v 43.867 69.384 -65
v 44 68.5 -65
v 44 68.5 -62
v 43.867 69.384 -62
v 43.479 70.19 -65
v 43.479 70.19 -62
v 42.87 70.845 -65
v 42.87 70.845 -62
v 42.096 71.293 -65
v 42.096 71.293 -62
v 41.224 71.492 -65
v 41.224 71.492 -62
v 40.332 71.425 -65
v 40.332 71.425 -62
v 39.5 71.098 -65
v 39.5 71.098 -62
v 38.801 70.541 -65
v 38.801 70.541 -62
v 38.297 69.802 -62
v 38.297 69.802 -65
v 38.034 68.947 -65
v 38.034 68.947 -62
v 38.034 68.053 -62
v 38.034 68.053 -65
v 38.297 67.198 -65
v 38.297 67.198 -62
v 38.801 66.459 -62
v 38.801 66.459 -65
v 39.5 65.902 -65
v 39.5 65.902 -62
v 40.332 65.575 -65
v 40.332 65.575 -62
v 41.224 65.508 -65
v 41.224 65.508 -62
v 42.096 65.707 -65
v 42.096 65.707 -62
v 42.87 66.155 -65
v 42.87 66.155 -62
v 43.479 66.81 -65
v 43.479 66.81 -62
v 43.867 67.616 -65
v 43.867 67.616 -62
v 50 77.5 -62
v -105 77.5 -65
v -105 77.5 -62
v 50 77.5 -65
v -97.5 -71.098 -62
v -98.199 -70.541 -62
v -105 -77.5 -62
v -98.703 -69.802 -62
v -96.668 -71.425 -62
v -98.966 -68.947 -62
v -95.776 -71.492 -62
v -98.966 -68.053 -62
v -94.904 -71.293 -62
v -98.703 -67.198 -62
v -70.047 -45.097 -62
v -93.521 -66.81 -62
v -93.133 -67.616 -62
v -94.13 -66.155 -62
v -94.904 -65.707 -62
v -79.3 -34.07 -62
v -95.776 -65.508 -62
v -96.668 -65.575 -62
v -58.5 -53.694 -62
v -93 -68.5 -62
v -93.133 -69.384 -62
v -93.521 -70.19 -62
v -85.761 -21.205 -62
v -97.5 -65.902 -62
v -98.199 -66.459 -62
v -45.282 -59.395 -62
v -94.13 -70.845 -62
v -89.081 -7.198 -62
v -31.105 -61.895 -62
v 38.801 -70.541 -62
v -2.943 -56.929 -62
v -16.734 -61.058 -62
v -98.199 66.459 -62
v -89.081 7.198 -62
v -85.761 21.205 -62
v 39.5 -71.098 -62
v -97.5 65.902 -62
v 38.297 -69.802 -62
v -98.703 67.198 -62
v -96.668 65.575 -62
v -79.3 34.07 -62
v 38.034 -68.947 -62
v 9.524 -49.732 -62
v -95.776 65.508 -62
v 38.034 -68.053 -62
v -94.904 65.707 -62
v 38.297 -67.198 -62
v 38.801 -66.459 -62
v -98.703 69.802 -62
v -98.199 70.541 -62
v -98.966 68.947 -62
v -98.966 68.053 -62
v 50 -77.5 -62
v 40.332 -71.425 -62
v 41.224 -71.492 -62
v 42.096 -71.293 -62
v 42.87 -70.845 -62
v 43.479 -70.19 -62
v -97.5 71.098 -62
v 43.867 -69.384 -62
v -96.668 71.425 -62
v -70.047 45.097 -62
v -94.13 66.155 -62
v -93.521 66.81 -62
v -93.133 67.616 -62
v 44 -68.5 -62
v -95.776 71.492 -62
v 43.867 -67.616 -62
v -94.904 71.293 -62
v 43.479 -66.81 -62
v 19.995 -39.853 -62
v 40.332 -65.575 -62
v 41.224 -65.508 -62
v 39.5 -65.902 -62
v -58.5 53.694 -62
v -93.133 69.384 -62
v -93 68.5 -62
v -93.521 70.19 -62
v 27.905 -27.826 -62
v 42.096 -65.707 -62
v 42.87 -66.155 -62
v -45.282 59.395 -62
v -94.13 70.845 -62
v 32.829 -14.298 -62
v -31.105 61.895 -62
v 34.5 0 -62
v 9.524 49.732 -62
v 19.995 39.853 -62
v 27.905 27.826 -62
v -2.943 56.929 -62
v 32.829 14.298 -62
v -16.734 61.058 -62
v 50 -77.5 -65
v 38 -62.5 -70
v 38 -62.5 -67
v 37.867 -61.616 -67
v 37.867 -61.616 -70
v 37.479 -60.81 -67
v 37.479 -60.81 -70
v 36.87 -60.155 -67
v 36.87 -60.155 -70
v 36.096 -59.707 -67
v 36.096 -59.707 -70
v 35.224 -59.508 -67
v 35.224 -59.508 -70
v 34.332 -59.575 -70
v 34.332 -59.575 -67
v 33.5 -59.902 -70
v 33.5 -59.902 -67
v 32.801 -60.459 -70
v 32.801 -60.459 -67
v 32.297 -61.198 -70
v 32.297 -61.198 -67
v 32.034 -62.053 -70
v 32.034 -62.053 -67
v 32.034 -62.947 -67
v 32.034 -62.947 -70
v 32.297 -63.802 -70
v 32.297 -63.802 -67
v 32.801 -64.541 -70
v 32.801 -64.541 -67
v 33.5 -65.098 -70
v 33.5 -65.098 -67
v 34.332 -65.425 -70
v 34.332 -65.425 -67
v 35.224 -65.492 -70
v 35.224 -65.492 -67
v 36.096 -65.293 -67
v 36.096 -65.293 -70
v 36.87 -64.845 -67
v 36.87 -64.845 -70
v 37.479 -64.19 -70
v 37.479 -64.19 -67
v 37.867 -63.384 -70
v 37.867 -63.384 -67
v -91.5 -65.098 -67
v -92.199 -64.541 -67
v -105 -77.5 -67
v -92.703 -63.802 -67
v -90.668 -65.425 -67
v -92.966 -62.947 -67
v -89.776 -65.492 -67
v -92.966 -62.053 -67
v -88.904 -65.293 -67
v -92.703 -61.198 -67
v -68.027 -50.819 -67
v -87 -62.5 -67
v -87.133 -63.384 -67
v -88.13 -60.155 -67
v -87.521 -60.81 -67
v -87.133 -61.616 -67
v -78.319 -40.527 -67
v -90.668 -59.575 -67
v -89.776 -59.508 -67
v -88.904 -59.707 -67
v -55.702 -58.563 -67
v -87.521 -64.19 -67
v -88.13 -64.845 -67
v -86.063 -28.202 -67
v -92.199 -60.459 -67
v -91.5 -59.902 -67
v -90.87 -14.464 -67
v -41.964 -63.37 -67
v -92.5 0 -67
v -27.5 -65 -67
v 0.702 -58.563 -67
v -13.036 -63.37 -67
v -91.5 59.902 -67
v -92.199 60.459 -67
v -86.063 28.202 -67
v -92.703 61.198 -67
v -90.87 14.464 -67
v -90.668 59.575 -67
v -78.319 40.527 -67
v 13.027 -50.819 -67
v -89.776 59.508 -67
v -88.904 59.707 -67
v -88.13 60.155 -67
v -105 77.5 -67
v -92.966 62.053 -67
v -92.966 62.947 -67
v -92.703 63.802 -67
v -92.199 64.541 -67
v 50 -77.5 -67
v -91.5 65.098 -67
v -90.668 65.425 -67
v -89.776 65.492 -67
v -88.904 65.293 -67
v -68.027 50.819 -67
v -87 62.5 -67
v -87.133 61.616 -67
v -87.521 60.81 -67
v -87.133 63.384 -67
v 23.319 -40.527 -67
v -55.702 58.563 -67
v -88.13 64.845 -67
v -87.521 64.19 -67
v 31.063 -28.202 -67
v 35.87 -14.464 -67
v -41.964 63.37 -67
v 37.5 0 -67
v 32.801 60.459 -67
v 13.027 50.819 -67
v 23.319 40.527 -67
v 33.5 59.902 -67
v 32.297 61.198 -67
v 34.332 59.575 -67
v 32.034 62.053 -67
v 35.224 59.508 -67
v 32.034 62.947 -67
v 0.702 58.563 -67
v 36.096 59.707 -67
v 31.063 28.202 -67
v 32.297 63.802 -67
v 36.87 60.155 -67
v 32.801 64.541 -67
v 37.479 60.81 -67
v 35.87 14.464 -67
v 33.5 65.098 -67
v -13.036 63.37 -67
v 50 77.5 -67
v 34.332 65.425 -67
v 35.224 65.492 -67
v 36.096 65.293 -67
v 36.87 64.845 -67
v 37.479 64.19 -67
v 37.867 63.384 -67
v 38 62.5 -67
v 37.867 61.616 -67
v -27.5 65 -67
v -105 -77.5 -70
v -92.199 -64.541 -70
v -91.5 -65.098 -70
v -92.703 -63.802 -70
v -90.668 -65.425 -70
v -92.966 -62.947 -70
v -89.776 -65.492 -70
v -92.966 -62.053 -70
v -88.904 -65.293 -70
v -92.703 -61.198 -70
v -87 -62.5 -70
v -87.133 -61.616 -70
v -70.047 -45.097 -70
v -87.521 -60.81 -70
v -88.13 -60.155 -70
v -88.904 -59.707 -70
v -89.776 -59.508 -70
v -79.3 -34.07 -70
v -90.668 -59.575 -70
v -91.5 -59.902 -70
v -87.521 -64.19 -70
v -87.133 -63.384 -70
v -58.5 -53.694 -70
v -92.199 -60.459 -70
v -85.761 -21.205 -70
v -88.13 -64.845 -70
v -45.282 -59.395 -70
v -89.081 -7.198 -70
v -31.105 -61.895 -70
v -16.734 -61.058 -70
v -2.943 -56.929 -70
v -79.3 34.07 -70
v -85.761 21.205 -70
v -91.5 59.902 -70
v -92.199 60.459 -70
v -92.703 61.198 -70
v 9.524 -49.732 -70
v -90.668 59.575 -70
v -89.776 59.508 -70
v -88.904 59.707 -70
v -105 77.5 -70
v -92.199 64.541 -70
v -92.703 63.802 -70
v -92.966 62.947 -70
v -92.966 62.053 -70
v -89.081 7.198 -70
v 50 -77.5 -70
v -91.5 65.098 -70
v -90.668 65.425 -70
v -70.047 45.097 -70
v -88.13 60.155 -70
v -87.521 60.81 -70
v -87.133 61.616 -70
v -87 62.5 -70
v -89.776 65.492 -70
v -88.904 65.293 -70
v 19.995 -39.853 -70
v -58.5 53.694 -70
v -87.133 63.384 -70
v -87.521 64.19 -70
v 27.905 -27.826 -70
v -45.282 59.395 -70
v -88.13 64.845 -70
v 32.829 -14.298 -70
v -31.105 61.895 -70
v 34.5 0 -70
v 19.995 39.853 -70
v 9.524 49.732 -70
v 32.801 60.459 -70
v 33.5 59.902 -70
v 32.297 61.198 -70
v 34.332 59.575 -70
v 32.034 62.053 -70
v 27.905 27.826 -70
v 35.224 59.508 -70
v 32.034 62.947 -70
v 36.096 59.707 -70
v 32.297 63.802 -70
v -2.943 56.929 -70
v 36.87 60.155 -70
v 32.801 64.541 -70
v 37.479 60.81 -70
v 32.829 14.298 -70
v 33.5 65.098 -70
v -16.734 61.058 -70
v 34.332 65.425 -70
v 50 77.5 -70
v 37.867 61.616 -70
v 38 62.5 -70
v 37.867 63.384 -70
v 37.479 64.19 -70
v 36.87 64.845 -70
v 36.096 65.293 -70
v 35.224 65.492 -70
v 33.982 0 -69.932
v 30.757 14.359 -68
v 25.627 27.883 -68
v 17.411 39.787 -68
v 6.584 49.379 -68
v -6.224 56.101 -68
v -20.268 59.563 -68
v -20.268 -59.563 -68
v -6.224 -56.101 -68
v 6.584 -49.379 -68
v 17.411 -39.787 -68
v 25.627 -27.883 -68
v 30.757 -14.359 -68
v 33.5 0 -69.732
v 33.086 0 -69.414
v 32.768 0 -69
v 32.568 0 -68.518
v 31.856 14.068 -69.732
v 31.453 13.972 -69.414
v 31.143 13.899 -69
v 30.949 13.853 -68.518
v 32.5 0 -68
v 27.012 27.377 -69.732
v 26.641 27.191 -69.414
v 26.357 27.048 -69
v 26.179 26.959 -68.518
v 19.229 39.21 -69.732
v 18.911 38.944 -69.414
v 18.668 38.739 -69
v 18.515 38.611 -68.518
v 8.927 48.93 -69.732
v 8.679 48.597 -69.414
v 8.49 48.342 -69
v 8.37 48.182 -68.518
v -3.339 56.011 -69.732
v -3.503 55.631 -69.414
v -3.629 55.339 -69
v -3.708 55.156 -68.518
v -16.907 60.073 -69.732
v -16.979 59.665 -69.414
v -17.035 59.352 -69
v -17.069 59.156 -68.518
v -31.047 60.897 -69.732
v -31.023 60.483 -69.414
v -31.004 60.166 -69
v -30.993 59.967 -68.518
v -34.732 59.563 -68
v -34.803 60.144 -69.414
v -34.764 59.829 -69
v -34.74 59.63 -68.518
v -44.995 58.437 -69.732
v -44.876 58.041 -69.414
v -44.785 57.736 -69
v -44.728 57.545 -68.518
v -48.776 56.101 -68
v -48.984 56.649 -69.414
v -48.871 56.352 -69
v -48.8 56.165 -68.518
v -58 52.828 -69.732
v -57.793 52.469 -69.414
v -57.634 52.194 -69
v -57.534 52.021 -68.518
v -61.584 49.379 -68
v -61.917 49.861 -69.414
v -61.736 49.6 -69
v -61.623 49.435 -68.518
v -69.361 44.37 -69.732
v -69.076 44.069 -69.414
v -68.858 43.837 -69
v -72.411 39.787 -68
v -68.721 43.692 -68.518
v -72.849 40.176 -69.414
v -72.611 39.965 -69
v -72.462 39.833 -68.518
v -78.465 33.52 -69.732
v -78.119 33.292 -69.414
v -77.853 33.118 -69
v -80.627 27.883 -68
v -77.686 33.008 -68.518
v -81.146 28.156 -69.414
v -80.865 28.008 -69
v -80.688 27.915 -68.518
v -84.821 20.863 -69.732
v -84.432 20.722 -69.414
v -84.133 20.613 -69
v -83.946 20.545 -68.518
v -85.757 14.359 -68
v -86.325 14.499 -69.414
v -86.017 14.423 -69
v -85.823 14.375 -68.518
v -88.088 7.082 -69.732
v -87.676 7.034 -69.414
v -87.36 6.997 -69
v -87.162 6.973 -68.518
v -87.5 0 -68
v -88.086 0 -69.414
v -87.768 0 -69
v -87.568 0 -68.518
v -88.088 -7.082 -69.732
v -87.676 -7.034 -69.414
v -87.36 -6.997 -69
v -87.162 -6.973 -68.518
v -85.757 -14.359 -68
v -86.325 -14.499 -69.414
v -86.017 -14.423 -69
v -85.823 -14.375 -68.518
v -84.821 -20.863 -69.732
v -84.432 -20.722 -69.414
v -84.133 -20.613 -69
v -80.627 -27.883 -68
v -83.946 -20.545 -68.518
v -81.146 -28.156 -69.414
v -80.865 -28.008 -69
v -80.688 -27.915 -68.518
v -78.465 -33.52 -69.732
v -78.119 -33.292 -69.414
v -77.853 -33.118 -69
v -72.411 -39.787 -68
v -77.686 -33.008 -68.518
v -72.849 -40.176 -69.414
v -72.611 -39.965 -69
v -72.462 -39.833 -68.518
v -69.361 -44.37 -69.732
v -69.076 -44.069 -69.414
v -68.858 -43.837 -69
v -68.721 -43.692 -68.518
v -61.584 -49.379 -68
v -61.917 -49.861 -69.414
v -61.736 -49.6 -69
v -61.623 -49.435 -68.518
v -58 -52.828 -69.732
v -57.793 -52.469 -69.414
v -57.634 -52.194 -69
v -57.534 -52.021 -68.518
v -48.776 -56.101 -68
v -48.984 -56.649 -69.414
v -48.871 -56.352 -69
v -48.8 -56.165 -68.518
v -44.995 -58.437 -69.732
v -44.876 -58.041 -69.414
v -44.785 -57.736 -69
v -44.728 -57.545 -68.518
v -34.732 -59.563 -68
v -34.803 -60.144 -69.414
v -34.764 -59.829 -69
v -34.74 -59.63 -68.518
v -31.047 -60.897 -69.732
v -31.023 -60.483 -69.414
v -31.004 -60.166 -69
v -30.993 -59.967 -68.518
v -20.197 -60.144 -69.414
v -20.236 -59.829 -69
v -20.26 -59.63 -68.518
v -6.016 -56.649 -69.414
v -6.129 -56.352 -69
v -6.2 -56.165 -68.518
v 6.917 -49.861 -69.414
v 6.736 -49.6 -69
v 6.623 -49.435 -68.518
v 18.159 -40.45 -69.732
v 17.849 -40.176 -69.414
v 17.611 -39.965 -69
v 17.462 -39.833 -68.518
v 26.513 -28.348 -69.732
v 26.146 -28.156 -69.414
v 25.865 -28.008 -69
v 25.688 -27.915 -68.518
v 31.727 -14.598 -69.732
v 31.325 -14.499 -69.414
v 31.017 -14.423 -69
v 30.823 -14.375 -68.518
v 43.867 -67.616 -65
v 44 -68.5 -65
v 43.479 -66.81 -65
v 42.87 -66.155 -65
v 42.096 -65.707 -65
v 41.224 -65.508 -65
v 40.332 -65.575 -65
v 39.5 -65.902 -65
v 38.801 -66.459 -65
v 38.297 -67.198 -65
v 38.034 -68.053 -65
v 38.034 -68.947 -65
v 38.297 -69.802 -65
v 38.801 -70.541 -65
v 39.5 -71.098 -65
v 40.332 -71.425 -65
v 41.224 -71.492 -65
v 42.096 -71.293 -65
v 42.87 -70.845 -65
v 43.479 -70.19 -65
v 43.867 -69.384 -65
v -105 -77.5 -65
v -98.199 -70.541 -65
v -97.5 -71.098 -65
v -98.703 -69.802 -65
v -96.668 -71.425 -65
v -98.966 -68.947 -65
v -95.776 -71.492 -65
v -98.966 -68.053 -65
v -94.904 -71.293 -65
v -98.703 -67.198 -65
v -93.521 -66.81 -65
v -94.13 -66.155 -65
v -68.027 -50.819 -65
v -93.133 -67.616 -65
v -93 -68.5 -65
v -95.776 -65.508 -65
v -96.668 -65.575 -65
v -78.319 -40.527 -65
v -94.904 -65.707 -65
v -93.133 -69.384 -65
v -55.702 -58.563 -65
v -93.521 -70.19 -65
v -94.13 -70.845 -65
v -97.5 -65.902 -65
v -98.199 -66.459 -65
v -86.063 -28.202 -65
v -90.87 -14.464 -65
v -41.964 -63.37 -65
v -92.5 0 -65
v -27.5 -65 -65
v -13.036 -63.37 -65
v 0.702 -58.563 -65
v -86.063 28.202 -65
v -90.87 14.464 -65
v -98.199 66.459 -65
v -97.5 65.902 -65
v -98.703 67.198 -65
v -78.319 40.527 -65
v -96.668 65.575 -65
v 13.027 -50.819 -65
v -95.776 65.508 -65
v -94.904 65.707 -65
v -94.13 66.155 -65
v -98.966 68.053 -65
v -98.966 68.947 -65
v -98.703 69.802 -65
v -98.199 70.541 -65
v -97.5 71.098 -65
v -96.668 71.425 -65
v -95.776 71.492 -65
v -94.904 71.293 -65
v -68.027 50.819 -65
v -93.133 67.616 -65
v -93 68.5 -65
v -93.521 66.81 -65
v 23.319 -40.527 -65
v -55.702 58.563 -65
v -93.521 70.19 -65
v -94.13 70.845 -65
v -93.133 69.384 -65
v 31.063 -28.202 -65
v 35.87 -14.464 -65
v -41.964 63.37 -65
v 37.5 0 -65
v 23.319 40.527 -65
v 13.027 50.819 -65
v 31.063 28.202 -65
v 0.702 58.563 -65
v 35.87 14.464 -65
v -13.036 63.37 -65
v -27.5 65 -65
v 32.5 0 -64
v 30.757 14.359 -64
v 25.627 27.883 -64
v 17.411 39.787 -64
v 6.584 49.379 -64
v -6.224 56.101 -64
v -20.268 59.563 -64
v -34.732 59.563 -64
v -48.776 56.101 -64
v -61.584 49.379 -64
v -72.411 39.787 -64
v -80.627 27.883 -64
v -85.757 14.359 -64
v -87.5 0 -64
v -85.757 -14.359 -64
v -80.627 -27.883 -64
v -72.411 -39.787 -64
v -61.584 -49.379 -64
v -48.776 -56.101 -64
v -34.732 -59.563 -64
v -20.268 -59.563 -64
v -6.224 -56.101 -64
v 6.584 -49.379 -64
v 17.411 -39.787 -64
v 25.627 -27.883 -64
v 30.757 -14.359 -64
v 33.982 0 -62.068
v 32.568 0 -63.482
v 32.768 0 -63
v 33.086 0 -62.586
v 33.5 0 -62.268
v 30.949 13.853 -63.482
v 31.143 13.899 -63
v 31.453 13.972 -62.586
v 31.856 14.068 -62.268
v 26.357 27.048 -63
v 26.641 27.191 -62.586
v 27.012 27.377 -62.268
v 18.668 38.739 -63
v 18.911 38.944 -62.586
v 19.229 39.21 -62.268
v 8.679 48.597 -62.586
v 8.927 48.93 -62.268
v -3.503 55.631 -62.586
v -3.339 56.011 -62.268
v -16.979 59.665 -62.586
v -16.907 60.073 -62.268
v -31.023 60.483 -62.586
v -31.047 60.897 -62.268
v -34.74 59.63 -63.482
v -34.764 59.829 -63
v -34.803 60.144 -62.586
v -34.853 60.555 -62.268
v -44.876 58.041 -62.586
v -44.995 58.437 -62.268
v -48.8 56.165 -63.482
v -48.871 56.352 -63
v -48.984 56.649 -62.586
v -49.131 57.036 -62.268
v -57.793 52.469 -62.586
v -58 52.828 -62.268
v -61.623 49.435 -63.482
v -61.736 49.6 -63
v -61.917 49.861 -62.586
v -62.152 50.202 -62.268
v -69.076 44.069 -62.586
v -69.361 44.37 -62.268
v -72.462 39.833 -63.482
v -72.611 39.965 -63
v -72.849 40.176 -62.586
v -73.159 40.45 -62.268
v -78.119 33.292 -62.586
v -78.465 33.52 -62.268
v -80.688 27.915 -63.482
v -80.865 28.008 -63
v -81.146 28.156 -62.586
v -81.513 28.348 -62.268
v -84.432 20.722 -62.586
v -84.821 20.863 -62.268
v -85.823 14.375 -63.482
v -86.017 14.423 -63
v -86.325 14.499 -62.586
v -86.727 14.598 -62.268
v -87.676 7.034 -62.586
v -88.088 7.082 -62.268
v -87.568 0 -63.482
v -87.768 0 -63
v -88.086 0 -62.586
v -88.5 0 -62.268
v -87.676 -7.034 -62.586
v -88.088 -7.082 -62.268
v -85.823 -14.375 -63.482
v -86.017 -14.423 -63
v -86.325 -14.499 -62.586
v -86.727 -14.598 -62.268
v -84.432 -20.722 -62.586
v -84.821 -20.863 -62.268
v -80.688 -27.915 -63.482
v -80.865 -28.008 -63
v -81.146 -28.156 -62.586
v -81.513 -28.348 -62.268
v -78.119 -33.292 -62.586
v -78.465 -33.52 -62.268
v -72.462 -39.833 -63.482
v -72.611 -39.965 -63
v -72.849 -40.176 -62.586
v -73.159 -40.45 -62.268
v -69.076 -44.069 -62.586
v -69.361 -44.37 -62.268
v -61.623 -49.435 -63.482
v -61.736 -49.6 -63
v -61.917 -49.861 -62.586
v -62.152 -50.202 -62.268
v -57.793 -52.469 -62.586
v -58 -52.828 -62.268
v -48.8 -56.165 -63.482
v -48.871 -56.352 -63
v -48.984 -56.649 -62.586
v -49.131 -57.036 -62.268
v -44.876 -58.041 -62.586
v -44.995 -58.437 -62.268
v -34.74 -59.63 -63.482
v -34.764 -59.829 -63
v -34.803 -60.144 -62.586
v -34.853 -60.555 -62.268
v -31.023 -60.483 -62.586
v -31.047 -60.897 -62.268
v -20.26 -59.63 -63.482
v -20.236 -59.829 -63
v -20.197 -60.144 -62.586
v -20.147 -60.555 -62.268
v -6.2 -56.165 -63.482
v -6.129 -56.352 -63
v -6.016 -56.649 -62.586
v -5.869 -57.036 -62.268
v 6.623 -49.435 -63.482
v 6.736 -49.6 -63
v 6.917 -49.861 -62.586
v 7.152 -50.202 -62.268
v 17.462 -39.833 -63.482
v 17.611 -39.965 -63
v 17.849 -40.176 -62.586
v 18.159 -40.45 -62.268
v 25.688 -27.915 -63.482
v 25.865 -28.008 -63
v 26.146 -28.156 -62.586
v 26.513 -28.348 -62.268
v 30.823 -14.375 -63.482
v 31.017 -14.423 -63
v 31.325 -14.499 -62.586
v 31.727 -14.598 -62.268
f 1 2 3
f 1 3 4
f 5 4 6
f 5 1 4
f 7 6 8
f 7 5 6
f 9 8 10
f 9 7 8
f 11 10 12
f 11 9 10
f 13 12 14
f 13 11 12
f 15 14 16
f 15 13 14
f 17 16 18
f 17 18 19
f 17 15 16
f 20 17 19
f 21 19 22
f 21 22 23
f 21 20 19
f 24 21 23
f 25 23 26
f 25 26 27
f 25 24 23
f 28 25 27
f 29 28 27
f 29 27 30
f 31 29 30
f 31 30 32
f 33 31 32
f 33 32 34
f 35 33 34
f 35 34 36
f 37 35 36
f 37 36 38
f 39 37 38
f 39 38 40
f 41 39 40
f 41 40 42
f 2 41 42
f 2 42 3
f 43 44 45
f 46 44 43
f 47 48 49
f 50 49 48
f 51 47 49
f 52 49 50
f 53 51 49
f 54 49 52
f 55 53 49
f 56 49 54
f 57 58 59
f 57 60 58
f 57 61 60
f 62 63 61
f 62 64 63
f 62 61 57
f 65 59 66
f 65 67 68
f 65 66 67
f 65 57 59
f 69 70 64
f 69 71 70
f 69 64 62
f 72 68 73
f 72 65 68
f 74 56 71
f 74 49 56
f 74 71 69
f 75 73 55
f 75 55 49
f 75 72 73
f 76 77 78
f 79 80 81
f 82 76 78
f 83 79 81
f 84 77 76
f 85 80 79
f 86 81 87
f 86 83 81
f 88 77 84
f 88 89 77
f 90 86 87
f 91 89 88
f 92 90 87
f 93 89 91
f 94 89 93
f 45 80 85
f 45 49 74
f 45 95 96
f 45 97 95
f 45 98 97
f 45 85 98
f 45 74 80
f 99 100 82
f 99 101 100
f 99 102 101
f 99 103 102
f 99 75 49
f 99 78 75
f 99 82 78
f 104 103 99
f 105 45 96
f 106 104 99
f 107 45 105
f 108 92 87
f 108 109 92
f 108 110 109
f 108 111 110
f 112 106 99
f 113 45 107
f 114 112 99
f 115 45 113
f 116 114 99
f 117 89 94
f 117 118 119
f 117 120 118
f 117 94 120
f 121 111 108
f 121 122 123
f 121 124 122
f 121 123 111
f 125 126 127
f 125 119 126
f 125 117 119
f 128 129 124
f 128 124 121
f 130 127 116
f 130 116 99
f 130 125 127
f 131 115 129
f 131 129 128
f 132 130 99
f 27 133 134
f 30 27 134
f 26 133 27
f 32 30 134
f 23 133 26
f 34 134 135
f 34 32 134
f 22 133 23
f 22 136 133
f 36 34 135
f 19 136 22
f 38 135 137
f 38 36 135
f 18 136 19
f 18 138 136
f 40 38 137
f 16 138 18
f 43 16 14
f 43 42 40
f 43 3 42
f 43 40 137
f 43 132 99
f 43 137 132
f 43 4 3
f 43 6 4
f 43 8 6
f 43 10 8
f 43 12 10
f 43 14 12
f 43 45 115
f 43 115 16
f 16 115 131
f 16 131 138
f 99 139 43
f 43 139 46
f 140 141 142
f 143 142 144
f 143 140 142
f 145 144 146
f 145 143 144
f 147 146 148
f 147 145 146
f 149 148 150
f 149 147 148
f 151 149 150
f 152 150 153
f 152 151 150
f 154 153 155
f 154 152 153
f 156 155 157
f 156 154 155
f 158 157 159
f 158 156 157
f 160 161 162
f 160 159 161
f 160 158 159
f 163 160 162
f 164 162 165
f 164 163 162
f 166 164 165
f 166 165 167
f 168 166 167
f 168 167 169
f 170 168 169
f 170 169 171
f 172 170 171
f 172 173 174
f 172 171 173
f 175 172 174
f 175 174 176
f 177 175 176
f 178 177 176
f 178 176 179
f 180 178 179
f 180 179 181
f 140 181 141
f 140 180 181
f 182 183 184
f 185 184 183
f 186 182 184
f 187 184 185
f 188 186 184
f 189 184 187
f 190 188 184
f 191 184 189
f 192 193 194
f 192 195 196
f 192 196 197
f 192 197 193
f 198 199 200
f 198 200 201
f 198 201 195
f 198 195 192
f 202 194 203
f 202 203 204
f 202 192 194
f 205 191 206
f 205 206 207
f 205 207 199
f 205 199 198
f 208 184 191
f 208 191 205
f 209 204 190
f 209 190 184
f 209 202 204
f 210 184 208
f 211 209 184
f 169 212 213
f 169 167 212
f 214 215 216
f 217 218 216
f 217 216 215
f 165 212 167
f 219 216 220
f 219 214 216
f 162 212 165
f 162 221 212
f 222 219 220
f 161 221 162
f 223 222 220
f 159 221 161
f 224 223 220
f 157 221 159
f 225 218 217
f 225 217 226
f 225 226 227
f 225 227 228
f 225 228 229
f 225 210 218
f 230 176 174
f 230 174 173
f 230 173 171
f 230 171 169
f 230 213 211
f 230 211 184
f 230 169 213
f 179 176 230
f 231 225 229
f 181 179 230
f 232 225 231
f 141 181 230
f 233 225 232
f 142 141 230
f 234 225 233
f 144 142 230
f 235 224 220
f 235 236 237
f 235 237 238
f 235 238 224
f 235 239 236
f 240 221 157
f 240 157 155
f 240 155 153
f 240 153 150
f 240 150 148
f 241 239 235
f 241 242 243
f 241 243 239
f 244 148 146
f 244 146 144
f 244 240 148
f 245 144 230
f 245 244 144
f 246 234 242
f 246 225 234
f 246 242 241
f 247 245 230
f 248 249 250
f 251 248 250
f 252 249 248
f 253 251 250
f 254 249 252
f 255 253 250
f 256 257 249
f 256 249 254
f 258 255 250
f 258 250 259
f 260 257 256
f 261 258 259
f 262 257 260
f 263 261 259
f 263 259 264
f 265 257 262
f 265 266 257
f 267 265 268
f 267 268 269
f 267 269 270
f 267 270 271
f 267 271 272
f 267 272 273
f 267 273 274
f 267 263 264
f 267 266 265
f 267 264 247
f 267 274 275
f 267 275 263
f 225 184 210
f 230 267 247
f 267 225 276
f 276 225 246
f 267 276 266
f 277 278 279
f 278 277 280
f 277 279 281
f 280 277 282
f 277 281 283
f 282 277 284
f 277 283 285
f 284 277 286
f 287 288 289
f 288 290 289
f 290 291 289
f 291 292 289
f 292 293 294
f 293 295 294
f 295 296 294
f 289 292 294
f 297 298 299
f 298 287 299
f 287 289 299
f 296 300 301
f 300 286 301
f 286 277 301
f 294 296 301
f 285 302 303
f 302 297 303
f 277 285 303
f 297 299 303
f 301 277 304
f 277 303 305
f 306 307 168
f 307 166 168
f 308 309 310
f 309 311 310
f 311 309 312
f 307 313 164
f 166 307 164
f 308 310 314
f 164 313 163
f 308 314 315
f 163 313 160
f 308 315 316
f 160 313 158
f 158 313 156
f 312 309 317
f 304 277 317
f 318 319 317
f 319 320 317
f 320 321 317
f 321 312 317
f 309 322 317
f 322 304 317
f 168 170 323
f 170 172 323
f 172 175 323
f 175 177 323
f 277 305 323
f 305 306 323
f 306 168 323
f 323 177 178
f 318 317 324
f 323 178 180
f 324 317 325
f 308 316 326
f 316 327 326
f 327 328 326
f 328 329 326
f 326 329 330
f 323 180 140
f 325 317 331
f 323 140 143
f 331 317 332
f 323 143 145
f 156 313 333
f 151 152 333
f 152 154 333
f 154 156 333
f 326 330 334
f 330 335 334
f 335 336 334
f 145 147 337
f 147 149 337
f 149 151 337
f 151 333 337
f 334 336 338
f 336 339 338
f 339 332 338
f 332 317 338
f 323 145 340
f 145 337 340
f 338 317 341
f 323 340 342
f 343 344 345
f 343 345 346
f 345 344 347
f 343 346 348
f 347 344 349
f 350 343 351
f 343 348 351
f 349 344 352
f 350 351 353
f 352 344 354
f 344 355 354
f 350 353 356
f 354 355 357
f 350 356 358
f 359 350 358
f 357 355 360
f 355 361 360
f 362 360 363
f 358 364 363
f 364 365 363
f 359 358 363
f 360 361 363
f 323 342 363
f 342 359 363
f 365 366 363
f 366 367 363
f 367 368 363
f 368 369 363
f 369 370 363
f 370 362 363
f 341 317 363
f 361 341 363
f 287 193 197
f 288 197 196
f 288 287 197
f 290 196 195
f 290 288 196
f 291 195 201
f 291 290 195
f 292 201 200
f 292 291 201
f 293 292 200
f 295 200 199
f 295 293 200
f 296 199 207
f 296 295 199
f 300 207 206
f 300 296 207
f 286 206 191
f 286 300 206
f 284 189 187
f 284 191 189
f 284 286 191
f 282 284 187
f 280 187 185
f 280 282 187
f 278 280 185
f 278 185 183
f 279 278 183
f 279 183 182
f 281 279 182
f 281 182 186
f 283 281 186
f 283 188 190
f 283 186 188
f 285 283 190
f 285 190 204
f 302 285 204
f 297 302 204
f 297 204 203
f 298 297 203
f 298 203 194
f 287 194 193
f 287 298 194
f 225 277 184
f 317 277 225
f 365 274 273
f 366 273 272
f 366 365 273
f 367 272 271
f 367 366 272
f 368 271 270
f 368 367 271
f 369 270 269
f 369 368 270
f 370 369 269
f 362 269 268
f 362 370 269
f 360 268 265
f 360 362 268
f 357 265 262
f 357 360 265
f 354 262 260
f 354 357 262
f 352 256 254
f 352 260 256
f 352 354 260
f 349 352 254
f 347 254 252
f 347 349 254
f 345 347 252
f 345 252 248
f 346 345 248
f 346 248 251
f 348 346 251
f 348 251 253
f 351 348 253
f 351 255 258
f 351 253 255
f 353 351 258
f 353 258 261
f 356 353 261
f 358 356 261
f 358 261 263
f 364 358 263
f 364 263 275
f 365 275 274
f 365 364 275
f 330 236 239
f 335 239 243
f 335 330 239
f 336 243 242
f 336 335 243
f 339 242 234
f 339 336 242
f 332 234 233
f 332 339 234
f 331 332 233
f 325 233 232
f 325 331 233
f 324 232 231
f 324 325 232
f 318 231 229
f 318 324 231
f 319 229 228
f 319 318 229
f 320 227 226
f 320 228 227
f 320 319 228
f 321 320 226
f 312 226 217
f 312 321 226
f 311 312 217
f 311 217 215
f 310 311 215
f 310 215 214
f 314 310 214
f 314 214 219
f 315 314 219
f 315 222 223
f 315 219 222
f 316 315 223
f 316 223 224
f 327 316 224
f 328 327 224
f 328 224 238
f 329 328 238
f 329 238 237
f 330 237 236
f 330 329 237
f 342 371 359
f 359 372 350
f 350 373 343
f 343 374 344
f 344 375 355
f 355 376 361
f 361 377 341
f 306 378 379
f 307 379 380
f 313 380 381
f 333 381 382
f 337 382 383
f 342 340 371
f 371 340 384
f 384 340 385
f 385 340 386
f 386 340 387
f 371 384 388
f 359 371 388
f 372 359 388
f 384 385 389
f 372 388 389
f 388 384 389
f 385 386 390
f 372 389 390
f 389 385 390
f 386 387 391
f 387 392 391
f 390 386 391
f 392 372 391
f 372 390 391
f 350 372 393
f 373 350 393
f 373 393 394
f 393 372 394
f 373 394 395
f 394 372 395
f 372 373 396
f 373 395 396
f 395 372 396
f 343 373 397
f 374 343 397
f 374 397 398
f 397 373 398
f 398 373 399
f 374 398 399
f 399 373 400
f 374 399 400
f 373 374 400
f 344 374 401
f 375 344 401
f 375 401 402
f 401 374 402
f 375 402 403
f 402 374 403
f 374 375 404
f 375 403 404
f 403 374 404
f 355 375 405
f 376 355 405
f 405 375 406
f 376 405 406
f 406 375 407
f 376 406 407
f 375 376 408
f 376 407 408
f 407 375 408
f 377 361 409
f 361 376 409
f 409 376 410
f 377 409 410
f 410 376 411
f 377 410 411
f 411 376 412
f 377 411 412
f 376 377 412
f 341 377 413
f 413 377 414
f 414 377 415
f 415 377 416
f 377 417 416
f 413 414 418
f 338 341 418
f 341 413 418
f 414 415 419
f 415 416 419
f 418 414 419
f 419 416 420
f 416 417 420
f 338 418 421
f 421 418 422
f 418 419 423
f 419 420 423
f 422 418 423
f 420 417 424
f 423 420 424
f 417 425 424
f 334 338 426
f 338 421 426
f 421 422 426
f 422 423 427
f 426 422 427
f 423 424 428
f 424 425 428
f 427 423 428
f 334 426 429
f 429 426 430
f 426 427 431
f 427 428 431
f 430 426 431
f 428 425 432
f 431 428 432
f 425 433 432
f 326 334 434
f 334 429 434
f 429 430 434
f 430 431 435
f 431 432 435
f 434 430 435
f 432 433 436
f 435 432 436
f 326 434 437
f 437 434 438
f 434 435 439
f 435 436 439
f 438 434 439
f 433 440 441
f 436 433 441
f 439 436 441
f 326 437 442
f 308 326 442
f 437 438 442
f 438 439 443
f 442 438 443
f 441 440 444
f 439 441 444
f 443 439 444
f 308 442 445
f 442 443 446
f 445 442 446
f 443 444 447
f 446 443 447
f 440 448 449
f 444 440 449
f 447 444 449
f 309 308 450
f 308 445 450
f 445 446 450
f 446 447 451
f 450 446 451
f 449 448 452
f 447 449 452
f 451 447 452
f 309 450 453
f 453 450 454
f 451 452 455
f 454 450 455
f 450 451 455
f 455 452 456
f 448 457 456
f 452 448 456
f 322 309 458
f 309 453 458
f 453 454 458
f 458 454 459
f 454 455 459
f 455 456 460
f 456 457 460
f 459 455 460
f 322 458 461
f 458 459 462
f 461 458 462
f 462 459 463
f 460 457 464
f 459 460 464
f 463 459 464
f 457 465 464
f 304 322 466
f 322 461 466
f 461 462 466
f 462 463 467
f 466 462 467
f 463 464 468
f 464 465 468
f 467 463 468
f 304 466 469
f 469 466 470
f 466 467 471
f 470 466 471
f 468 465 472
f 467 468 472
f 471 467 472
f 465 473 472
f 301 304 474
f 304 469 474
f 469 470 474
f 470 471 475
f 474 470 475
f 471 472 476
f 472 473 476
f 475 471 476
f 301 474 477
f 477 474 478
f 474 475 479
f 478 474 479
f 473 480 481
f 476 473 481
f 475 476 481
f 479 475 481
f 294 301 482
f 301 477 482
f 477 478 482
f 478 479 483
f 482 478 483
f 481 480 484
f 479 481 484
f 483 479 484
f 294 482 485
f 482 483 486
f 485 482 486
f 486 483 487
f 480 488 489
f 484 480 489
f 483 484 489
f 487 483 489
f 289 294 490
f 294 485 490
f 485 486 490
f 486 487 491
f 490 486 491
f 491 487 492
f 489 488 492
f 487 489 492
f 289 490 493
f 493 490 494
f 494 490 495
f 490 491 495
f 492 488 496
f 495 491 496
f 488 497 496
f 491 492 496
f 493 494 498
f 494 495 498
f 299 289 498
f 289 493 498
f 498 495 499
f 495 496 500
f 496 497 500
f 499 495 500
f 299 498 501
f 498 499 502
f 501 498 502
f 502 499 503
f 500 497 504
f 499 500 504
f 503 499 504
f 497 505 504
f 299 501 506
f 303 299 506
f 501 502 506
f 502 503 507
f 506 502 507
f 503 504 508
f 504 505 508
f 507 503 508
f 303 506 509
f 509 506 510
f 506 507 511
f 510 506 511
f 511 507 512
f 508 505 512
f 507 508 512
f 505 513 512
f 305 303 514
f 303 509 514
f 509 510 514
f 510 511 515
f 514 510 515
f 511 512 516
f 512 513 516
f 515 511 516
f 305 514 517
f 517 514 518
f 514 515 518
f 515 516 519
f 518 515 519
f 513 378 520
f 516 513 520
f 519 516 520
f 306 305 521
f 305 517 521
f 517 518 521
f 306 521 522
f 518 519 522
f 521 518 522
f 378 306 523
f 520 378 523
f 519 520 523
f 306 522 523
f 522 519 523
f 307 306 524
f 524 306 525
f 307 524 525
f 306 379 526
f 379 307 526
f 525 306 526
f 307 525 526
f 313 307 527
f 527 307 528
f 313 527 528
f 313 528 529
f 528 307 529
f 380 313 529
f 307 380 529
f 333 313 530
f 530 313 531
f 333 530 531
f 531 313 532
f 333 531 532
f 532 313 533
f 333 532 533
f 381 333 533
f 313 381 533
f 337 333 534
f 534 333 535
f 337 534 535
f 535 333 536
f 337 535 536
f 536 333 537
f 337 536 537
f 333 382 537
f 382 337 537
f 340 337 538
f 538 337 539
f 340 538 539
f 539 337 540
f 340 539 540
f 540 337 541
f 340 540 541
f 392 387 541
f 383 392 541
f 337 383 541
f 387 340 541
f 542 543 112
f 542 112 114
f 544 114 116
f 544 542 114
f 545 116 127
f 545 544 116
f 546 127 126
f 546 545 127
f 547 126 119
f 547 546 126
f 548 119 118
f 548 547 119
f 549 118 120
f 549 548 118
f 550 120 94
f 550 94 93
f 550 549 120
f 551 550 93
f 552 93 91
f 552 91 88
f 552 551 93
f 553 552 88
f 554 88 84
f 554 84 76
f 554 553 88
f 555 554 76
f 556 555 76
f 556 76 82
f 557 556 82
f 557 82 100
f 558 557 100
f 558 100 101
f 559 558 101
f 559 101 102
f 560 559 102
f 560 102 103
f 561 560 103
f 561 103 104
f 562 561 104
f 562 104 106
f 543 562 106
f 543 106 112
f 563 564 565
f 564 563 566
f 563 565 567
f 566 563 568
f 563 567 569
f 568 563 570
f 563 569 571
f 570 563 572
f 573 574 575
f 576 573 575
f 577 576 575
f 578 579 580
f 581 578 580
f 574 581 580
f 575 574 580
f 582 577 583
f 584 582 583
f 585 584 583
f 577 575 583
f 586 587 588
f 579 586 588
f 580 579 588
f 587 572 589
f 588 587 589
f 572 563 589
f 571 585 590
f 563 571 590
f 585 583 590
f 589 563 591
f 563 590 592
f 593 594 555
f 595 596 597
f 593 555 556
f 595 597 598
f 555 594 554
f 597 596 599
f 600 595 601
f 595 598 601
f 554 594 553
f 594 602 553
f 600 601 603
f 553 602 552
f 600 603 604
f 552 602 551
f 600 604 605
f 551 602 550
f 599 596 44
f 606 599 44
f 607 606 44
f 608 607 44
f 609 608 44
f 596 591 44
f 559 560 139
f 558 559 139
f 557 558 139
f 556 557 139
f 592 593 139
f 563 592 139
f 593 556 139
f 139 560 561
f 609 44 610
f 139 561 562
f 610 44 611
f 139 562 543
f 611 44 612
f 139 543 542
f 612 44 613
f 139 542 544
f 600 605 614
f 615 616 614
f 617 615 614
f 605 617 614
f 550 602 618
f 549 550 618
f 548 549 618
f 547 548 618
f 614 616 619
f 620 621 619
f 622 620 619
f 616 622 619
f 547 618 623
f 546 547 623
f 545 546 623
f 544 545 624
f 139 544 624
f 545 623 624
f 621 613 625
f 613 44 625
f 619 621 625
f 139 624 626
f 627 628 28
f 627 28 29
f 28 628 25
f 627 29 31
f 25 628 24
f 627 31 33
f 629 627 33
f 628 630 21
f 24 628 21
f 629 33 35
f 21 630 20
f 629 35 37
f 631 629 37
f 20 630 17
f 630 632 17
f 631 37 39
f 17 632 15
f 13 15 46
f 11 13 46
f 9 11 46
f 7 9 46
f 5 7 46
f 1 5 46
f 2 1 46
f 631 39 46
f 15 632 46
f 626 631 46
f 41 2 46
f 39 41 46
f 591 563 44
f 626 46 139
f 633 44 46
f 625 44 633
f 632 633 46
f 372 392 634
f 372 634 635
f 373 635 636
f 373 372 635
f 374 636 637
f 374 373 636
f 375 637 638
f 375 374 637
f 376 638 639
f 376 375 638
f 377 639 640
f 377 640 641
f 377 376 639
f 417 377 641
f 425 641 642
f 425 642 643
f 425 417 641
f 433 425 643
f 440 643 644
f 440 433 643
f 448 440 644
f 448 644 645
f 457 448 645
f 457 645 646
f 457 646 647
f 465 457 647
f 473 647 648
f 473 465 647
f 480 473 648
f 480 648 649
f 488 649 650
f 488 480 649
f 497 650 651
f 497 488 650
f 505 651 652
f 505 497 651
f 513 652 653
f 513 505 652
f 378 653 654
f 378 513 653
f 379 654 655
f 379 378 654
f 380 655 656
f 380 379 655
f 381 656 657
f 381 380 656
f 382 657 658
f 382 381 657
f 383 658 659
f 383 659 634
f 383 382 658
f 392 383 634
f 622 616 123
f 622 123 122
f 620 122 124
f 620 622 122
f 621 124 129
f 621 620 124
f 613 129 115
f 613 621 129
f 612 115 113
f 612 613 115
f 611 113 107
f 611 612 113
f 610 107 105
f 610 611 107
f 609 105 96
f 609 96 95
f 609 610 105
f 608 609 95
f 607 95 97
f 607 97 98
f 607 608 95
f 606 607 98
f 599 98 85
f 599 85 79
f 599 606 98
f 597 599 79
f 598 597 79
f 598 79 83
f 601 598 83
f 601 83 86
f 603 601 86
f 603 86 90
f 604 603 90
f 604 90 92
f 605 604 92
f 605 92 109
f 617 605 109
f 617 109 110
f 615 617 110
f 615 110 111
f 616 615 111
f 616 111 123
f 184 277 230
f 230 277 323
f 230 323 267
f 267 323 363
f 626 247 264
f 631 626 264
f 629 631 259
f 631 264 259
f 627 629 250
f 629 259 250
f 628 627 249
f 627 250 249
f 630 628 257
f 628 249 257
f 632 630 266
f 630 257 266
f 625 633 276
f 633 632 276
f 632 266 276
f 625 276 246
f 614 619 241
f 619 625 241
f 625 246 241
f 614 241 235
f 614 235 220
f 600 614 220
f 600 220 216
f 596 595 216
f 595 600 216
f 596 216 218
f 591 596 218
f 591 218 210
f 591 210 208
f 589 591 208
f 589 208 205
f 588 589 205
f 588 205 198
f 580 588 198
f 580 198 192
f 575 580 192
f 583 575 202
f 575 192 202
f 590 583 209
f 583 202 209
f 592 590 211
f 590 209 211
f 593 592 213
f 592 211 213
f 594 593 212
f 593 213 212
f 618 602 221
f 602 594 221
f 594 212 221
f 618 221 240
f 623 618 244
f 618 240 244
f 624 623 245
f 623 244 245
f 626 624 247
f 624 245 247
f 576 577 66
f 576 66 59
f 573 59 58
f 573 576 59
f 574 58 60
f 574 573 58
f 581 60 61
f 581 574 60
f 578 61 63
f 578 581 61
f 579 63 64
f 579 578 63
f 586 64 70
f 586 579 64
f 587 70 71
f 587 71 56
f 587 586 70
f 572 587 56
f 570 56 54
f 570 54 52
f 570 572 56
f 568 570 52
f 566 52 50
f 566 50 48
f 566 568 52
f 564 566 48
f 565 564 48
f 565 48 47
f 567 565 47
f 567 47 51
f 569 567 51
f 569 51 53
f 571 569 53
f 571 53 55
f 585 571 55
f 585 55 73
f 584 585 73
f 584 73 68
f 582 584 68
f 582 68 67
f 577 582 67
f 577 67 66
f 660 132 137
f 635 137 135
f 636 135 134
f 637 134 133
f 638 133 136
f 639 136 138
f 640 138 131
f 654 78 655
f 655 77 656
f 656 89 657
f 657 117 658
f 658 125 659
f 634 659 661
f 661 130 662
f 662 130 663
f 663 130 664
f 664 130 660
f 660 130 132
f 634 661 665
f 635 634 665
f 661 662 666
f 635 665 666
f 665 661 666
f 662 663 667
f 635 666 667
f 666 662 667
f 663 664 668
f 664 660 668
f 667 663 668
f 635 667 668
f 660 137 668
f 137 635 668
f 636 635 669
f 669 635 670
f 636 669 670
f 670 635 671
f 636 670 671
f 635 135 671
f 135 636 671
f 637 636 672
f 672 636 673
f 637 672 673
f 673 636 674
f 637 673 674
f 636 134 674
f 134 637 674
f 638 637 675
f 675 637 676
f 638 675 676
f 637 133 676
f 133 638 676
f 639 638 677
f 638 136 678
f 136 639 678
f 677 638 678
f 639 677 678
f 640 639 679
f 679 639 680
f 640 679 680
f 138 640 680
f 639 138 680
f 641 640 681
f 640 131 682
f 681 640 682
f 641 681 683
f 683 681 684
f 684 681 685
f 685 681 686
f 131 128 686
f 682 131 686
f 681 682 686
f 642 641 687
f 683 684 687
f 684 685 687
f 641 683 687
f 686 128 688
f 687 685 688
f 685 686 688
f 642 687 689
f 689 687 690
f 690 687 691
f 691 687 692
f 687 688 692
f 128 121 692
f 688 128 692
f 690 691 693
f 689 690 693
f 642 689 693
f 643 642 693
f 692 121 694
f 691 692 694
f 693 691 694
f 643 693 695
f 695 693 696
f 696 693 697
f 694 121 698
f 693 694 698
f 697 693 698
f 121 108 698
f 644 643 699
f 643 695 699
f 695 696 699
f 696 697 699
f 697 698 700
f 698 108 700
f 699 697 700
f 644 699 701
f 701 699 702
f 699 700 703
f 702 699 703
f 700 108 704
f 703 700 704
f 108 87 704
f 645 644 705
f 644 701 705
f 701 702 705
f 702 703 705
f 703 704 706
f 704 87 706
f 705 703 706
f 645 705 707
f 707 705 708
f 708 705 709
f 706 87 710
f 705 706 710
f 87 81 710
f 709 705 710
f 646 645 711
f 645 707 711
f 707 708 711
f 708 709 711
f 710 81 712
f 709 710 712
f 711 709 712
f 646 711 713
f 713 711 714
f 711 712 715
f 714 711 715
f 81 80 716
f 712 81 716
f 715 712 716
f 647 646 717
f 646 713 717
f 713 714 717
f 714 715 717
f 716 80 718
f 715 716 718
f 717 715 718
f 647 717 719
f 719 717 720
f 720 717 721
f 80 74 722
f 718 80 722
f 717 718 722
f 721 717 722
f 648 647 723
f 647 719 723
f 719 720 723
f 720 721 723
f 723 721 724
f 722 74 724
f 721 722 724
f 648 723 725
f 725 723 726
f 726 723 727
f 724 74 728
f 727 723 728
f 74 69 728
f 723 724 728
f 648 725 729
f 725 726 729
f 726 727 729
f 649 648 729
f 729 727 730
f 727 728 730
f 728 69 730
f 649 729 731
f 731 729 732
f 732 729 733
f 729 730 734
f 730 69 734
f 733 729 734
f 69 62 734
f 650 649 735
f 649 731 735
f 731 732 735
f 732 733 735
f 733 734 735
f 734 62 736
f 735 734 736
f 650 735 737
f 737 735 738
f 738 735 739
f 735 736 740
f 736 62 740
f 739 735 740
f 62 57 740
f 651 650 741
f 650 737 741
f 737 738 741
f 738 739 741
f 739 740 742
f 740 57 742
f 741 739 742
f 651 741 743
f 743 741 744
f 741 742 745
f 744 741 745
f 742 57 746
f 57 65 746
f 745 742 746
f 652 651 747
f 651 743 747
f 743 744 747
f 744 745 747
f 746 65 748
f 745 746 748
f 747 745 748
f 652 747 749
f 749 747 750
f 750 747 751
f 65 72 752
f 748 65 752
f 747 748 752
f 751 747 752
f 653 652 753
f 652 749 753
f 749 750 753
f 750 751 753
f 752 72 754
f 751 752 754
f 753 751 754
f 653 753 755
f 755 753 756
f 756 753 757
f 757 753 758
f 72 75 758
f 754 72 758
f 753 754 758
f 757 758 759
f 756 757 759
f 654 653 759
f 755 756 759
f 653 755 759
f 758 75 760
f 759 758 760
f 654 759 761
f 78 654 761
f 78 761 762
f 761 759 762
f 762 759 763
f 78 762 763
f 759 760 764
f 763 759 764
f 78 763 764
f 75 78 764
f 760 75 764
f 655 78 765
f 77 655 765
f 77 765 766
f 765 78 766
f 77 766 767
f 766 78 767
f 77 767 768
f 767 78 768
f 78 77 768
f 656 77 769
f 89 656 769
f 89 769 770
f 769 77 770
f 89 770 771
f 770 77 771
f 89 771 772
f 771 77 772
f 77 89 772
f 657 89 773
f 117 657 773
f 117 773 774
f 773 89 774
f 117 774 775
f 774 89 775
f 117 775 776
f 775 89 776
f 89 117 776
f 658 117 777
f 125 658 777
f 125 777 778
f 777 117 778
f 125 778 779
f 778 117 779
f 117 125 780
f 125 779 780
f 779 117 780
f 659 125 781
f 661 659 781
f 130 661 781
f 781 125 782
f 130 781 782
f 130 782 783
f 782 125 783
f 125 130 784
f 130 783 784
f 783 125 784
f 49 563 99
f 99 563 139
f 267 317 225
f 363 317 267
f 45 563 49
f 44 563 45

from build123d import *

# Parameters (mm, degrees)
CYLINDER058_R     = 3
CYLINDER058_DEPTH = 4
CYLINDER059_R     = 3
CYLINDER059_DEPTH = 4
CYLINDER060_R     = 3
CYLINDER060_DEPTH = 4
CYLINDER061_R     = 3
CYLINDER061_DEPTH = 4
CYLINDER062_R     = 3
CYLINDER062_DEPTH = 4
CYLINDER063_R     = 3
CYLINDER063_DEPTH = 4
CYLINDER064_R     = 3
CYLINDER064_DEPTH = 4
CYLINDER065_R     = 3
CYLINDER065_DEPTH = 4
CYLINDER056_R     = 60
CYLINDER056_DEPTH = 8
BOX015_W          = 155
BOX015_H          = 155
BOX015_DEPTH      = 3
CYLINDER057_R     = 65
CYLINDER057_DEPTH = 8
BOX016_W          = 155
BOX016_H          = 155
BOX016_DEPTH      = 3
FILLET008_R       = 2


with BuildPart() as cylinder086:
    # Cylinder058 → Cylinder058 (new body)
    with BuildSketch(Plane(origin=(35, 62.5, -30), x_dir=(1, 0, 0), z_dir=(0, 0, 1))):
        Circle(CYLINDER058_R)
    extrude(amount=CYLINDER058_DEPTH)


with BuildPart() as cylinder087:
    # Cylinder059 → Cylinder059 (new body)
    with BuildSketch(Plane(origin=(35, -62.5, -30), x_dir=(1, 0, 0), z_dir=(0, 0, 1))):
        Circle(CYLINDER059_R)
    extrude(amount=CYLINDER059_DEPTH)


with BuildPart() as cylinder088:
    # Cylinder060 → Cylinder060 (new body)
    with BuildSketch(Plane(origin=(-90, 62.5, -30), x_dir=(1, 0, 0), z_dir=(0, 0, 1))):
        Circle(CYLINDER060_R)
    extrude(amount=CYLINDER060_DEPTH)


with BuildPart() as lower_plate_screw_holes:
    # Cylinder061 → Cylinder061 (new body)
    with BuildSketch(Plane(origin=(-90, -62.5, -30), x_dir=(1, 0, 0), z_dir=(0, 0, 1))):
        Circle(CYLINDER061_R)
    extrude(amount=CYLINDER061_DEPTH)

    # Fusion025: union Cylinder086, Cylinder087, Cylinder088
    add(cylinder086.part)
    add(cylinder087.part)
    add(cylinder088.part)


with BuildPart() as cylinder090:
    # Cylinder062 → Cylinder062 (new body)
    with BuildSketch(Plane(origin=(41, -68.5, -26), x_dir=(1, 0, 0), z_dir=(0, 0, 1))):
        Circle(CYLINDER062_R)
    extrude(amount=CYLINDER062_DEPTH)


with BuildPart() as cylinder091:
    # Cylinder063 → Cylinder063 (new body)
    with BuildSketch(Plane(origin=(-96, 68.5, -26), x_dir=(1, 0, 0), z_dir=(0, 0, 1))):
        Circle(CYLINDER063_R)
    extrude(amount=CYLINDER063_DEPTH)


with BuildPart() as cylinder092:
    # Cylinder064 → Cylinder064 (new body)
    with BuildSketch(Plane(origin=(41, 68.5, -26), x_dir=(1, 0, 0), z_dir=(0, 0, 1))):
        Circle(CYLINDER064_R)
    extrude(amount=CYLINDER064_DEPTH)


with BuildPart() as lazy_susan_screw_holes:
    # Cylinder065 → Cylinder065 (new body)
    with BuildSketch(Plane(origin=(-96, -68.5, -26), x_dir=(1, 0, 0), z_dir=(0, 0, 1))):
        Circle(CYLINDER065_R)
    extrude(amount=CYLINDER065_DEPTH)

    # Fusion026: union Cylinder090, Cylinder091, Cylinder092
    add(cylinder090.part)
    add(cylinder091.part)
    add(cylinder092.part)

    # Fusion027: union lower plate screw holes
    add(lower_plate_screw_holes.part)


with BuildPart() as cylinder084:
    # Cylinder056 → Cylinder056 (new body)
    with BuildSketch(Plane(origin=(77.5, 77.5, -30), x_dir=(1, 0, 0), z_dir=(0, 0, 1))):
        Circle(CYLINDER056_R)
    extrude(amount=CYLINDER056_DEPTH)


with BuildPart() as cube008:
    # Box015 → Box015 (new body)
    with BuildSketch(Plane.XY.offset(-25)):
        with Locations((77.5, 77.5)):
            Rectangle(BOX015_W, BOX015_H)
    extrude(amount=BOX015_DEPTH)


with BuildPart() as cylinder085:
    # Cylinder057 → Cylinder057 (new body)
    with BuildSketch(Plane(origin=(77.5, 77.5, -30), x_dir=(1, 0, 0), z_dir=(0, 0, 1))):
        Circle(CYLINDER057_R)
    extrude(amount=CYLINDER057_DEPTH)


with BuildPart() as lazy_susan001:
    # Box016 → Box016 (new body)
    with BuildSketch(Plane.XY.offset(-30)):
        with Locations((77.5, 77.5)):
            Rectangle(BOX016_W, BOX016_H)
    extrude(amount=BOX016_DEPTH)

    # Fusion024: union Cube008, Cylinder085
    add(cube008.part)
    add(cylinder085.part)

    # Cut022: cut Cylinder084
    add(cylinder084.part, mode=Mode.SUBTRACT)


with BuildPart() as lazy_susan001_1:
    # Cut022 placement: moved
    add(lazy_susan001.part.moved(Location((-105, -77.5, 0))))

    # Fillet008
    fillet008_edges = [lazy_susan001_1.edges().sort_by_distance(p)[0] for p in [
        (-87.5, 0, -22),
        (-87.5, 0, -30),
    ]]
    fillet(fillet008_edges, radius=FILLET008_R)

    # Cut023: cut Lazy susan screw holes
    add(lazy_susan_screw_holes.part, mode=Mode.SUBTRACT)


with BuildPart() as lazy_susan001_2:
    # Cut023 placement: moved
    add(lazy_susan001_1.part.moved(Location((0, 0, -40))))


solid = lazy_susan001_2.part
